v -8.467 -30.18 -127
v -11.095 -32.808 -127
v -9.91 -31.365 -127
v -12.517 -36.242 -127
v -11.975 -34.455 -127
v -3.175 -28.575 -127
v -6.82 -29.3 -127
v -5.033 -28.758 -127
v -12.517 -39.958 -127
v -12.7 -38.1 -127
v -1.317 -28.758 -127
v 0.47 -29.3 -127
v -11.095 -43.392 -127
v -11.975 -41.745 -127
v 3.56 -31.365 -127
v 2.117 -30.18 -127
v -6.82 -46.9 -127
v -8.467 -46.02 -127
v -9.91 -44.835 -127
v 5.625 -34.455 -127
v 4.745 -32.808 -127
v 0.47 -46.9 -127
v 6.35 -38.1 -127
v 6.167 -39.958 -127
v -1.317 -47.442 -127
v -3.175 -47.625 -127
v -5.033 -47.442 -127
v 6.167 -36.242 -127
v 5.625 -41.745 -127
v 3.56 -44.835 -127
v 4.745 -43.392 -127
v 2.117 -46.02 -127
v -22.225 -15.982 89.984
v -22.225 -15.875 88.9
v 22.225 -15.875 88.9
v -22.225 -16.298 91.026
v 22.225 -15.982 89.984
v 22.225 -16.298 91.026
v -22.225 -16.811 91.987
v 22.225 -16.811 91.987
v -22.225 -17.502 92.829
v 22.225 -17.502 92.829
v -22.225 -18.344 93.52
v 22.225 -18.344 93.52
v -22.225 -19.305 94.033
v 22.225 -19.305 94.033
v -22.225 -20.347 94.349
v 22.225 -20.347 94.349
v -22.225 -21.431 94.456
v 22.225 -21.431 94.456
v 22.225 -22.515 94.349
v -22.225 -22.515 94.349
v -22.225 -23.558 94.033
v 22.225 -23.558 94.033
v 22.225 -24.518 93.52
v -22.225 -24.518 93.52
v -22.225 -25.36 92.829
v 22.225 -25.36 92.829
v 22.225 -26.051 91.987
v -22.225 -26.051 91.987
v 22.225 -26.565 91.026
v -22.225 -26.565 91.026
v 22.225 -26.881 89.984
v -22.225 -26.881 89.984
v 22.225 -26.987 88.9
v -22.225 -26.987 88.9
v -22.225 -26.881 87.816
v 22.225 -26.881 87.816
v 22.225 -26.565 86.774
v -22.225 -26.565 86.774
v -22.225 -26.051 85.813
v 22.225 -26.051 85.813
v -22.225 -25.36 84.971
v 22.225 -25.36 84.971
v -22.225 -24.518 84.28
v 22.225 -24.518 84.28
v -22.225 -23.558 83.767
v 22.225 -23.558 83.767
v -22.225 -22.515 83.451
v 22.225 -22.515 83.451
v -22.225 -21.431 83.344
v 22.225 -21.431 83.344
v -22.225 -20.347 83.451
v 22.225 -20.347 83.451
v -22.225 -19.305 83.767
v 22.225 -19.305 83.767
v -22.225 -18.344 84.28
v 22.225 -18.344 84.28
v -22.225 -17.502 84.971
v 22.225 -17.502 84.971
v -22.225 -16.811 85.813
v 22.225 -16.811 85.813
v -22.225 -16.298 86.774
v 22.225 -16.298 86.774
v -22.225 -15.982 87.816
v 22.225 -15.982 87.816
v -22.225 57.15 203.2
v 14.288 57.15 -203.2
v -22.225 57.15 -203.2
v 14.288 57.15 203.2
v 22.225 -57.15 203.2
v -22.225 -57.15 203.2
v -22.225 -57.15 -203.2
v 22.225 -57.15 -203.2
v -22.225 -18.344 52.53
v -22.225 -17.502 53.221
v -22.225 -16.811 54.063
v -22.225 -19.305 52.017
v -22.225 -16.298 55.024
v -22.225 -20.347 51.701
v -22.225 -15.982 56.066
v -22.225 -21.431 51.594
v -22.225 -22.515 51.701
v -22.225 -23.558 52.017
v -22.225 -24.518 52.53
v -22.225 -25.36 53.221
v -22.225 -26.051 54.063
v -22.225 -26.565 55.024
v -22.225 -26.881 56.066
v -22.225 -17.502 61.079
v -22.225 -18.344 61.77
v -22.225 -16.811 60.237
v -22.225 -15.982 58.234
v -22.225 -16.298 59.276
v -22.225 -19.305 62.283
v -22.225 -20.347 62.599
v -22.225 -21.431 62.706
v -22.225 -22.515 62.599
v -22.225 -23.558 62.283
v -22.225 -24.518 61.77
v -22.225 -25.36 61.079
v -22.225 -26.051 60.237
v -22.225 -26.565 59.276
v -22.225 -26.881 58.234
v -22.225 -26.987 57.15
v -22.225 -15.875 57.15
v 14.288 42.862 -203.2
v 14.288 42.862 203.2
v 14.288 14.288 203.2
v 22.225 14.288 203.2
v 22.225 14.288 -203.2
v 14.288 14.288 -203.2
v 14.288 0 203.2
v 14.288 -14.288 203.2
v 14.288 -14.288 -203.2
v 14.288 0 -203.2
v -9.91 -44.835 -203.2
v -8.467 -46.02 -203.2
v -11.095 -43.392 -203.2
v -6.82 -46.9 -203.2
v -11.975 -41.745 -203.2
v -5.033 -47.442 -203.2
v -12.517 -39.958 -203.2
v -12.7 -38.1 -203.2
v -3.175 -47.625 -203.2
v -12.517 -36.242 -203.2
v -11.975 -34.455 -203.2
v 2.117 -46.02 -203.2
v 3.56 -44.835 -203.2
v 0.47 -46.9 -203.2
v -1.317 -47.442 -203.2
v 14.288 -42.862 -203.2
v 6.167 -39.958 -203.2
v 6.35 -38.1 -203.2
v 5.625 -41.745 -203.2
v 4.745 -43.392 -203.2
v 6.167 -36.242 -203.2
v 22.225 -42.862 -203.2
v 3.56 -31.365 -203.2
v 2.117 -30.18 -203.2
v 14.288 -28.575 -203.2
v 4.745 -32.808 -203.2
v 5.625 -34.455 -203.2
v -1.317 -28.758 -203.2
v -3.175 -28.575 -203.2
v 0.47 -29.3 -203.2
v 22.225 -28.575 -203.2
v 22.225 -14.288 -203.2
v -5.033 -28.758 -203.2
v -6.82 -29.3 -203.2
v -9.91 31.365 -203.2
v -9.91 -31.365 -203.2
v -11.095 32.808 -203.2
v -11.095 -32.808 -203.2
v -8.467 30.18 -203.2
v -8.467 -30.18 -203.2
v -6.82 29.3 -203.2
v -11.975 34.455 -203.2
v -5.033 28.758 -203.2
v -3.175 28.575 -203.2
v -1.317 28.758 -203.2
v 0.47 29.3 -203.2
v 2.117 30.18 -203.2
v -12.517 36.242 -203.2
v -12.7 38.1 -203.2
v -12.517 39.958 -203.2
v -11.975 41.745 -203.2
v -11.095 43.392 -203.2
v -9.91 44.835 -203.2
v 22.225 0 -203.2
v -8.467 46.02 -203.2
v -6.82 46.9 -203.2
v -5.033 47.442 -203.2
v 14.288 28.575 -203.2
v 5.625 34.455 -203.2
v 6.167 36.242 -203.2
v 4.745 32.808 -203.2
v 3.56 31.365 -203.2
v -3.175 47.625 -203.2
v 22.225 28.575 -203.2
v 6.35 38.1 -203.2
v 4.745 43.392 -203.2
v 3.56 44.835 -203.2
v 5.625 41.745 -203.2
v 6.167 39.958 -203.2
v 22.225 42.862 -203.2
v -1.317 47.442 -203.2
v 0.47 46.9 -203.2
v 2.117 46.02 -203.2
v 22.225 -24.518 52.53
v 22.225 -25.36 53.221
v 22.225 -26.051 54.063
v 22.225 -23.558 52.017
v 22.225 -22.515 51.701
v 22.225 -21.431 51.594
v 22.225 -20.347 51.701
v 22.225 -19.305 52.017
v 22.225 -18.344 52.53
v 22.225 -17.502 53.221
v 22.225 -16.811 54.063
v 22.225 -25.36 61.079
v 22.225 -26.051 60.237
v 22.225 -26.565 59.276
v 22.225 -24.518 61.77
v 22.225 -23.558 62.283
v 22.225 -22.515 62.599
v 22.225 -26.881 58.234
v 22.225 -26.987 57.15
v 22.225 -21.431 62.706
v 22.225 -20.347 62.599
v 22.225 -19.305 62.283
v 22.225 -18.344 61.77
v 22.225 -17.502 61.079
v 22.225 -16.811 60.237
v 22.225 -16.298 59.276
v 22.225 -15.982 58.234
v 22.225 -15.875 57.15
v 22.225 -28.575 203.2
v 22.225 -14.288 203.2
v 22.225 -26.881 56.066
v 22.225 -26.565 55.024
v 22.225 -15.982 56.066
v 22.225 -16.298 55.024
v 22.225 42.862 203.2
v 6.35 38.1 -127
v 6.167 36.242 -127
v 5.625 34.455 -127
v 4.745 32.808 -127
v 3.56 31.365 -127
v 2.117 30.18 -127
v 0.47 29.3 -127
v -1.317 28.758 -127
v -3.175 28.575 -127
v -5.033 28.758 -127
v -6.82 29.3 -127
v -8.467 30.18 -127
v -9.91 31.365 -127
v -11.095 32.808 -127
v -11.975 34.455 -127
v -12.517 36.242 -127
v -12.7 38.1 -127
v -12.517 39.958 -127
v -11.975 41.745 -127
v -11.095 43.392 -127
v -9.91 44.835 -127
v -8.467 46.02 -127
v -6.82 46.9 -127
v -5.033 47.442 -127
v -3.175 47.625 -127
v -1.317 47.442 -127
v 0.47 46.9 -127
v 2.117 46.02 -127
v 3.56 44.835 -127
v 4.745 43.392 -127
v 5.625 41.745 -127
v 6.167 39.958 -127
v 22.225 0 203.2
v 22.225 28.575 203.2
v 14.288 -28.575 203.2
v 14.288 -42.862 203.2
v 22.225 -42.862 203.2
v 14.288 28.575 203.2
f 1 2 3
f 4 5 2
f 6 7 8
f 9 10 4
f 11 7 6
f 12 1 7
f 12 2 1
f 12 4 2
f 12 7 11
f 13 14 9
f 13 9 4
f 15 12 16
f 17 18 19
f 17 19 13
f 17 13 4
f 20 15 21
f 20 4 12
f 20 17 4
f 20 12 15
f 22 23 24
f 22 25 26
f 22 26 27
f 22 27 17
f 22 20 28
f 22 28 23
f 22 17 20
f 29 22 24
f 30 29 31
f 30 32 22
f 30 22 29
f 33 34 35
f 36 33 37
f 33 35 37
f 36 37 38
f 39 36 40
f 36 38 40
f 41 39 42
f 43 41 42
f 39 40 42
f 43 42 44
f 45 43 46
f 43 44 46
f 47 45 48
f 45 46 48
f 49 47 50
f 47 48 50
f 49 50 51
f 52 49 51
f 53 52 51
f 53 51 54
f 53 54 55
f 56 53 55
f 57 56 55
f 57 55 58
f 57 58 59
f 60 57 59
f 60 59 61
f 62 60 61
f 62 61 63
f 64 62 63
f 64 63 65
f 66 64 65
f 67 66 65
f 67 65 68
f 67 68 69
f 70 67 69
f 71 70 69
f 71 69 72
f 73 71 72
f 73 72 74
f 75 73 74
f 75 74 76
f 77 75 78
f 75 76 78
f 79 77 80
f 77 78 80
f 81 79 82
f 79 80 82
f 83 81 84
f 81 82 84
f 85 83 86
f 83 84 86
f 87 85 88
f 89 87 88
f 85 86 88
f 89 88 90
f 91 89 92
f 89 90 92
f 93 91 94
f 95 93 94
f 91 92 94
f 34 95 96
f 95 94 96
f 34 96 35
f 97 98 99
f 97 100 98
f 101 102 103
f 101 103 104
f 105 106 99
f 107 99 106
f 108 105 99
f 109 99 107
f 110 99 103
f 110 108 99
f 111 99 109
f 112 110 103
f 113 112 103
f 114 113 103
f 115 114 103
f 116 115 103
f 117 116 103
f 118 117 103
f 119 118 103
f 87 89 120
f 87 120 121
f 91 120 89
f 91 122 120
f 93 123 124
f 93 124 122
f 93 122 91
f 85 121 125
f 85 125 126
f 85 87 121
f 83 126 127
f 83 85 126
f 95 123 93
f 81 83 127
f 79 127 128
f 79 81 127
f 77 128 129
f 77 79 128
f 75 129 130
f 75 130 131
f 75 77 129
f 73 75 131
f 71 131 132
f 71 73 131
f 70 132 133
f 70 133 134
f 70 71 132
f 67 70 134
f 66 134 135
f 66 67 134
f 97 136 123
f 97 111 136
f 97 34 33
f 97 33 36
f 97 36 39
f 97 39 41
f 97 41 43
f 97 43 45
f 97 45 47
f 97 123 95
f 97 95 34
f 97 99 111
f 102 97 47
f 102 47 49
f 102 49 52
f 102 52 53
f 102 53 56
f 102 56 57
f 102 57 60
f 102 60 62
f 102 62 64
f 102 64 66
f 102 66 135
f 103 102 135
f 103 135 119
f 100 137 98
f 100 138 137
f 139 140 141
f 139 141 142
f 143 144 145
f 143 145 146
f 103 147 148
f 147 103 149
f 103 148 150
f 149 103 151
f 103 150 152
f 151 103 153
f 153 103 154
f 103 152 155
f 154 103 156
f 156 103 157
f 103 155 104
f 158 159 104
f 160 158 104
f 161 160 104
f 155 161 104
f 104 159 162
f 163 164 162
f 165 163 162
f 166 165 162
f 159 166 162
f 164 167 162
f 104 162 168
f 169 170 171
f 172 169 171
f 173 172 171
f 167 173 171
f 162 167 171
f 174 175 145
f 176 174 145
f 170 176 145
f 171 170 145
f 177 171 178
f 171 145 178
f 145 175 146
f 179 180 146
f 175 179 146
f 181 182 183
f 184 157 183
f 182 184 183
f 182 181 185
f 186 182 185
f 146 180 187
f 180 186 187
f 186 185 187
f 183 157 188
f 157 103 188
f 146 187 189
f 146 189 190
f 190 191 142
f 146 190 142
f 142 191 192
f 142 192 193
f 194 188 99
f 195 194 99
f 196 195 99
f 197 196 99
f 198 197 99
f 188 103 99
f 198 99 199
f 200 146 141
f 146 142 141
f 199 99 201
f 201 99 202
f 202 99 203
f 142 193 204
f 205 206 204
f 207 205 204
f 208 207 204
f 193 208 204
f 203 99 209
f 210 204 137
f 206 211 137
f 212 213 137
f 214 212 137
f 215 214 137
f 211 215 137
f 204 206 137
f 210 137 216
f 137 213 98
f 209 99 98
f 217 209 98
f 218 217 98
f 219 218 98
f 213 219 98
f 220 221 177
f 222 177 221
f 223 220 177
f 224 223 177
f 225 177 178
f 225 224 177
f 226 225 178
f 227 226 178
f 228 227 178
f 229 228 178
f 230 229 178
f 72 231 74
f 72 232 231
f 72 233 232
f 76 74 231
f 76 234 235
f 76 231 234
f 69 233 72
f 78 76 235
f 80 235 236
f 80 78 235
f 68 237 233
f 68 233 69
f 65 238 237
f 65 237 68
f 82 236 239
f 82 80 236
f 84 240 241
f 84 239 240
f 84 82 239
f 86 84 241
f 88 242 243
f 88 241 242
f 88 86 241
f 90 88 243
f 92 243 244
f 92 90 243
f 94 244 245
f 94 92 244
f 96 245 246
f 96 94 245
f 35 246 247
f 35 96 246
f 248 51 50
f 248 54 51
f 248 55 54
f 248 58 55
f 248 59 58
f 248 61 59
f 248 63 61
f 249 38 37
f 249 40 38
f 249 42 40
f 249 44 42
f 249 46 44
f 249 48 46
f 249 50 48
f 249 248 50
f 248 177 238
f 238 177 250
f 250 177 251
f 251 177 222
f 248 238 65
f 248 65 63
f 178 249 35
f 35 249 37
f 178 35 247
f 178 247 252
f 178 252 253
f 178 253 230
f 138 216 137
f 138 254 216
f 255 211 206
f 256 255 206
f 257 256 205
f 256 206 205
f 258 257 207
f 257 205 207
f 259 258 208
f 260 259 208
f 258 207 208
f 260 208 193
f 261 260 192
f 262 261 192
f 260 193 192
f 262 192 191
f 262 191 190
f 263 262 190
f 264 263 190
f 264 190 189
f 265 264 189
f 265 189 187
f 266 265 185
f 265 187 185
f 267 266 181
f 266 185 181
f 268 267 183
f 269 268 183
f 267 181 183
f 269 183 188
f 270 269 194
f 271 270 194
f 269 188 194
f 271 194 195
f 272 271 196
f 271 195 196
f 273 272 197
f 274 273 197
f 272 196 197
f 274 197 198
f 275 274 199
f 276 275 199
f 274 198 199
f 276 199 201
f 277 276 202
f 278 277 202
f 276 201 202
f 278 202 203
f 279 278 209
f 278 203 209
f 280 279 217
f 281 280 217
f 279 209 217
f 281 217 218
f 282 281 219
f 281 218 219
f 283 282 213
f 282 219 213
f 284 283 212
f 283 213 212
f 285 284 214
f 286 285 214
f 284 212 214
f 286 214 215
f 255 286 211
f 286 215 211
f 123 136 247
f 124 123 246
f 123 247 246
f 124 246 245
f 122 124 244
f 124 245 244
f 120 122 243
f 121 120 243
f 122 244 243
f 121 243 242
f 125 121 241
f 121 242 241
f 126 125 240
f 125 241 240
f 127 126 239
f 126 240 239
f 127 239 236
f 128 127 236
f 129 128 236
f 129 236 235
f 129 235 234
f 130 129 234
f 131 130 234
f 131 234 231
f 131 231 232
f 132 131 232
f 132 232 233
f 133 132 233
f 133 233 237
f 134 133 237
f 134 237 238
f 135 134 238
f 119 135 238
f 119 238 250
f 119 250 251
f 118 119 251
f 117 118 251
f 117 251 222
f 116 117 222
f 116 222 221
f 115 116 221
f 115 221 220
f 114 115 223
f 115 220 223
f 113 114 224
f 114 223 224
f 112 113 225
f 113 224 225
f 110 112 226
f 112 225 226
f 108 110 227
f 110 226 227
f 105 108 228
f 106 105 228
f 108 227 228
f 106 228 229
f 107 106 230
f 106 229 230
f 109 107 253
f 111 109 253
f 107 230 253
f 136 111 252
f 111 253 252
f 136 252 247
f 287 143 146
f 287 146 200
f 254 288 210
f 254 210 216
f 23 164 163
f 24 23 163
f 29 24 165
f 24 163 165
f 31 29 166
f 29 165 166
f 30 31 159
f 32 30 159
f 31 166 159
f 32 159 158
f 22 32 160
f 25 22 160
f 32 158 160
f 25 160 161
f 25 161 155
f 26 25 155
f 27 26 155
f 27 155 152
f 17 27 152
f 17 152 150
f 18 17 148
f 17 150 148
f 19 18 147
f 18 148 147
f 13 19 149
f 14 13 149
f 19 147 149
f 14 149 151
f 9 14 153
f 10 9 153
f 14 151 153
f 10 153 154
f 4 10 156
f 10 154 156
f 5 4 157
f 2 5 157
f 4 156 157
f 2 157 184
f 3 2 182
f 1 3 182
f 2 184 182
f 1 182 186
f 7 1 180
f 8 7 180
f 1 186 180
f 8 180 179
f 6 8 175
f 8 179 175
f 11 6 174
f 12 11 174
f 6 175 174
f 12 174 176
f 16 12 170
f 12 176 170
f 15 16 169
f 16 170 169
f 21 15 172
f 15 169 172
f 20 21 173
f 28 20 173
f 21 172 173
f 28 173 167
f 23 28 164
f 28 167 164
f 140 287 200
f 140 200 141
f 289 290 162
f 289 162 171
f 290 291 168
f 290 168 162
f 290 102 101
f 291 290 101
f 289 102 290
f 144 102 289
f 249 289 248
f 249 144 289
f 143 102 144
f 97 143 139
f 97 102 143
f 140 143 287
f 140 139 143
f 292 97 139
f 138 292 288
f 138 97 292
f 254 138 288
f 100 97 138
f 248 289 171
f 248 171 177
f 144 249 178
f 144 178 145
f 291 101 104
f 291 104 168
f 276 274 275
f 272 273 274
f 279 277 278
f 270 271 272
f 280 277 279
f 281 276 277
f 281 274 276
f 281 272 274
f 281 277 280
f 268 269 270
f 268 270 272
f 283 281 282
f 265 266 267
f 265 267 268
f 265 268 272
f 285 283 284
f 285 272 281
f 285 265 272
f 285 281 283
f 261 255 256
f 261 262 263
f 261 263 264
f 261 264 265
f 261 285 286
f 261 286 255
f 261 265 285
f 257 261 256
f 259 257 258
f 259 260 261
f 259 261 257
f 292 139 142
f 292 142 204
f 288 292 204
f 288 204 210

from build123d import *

# Parameters (mm, degrees)
F1_DEPTH = 203.2
F2_R     = 5.55625
F3_DEPTH = 44.451
F4_R     = 9.525
F5_DEPTH = 76.2


with BuildPart() as f1:
    # F0 (on Top) → F1 (new body, symmetric)
    with BuildSketch(Plane.XY):
        Polygon((14.2875, 57.15), (-22.225, 57.15), (-22.225, -57.15), (22.225, -57.15), (22.225, -42.8625), (14.2875, -42.8625), (14.2875, -28.575), (22.225, -28.575), (22.225, -14.2875), (14.2875, -14.2875), (14.2875, 0), (22.225, 0), (22.225, 14.2875), (14.2875, 14.2875), (14.2875, 28.575), (22.225, 28.575), (22.225, 42.8625), (14.2875, 42.8625), align=None)
    extrude(amount=F1_DEPTH, both=True)

    # F2 (on face) → F3 (cut, through all)
    with BuildSketch(Plane.YZ.offset(22.225)):
        with Locations((-21.43125, 88.9)):
            Circle(F2_R)
        with Locations((-21.43125, 57.15)):
            Circle(F2_R)
    extrude(amount=-F3_DEPTH, mode=Mode.SUBTRACT)

    # F4 (on face) → F5 (cut)
    with BuildSketch(Plane(origin=(0, 0, -203.2), x_dir=(1, 0, 0), z_dir=(0, 0, -1))):
        with Locations((-3.175, -38.1)):
            Circle(F4_R)
        with Locations((-3.175, 38.1)):
            Circle(F4_R)
    extrude(amount=-F5_DEPTH, mode=Mode.SUBTRACT)


solid = f1.part
